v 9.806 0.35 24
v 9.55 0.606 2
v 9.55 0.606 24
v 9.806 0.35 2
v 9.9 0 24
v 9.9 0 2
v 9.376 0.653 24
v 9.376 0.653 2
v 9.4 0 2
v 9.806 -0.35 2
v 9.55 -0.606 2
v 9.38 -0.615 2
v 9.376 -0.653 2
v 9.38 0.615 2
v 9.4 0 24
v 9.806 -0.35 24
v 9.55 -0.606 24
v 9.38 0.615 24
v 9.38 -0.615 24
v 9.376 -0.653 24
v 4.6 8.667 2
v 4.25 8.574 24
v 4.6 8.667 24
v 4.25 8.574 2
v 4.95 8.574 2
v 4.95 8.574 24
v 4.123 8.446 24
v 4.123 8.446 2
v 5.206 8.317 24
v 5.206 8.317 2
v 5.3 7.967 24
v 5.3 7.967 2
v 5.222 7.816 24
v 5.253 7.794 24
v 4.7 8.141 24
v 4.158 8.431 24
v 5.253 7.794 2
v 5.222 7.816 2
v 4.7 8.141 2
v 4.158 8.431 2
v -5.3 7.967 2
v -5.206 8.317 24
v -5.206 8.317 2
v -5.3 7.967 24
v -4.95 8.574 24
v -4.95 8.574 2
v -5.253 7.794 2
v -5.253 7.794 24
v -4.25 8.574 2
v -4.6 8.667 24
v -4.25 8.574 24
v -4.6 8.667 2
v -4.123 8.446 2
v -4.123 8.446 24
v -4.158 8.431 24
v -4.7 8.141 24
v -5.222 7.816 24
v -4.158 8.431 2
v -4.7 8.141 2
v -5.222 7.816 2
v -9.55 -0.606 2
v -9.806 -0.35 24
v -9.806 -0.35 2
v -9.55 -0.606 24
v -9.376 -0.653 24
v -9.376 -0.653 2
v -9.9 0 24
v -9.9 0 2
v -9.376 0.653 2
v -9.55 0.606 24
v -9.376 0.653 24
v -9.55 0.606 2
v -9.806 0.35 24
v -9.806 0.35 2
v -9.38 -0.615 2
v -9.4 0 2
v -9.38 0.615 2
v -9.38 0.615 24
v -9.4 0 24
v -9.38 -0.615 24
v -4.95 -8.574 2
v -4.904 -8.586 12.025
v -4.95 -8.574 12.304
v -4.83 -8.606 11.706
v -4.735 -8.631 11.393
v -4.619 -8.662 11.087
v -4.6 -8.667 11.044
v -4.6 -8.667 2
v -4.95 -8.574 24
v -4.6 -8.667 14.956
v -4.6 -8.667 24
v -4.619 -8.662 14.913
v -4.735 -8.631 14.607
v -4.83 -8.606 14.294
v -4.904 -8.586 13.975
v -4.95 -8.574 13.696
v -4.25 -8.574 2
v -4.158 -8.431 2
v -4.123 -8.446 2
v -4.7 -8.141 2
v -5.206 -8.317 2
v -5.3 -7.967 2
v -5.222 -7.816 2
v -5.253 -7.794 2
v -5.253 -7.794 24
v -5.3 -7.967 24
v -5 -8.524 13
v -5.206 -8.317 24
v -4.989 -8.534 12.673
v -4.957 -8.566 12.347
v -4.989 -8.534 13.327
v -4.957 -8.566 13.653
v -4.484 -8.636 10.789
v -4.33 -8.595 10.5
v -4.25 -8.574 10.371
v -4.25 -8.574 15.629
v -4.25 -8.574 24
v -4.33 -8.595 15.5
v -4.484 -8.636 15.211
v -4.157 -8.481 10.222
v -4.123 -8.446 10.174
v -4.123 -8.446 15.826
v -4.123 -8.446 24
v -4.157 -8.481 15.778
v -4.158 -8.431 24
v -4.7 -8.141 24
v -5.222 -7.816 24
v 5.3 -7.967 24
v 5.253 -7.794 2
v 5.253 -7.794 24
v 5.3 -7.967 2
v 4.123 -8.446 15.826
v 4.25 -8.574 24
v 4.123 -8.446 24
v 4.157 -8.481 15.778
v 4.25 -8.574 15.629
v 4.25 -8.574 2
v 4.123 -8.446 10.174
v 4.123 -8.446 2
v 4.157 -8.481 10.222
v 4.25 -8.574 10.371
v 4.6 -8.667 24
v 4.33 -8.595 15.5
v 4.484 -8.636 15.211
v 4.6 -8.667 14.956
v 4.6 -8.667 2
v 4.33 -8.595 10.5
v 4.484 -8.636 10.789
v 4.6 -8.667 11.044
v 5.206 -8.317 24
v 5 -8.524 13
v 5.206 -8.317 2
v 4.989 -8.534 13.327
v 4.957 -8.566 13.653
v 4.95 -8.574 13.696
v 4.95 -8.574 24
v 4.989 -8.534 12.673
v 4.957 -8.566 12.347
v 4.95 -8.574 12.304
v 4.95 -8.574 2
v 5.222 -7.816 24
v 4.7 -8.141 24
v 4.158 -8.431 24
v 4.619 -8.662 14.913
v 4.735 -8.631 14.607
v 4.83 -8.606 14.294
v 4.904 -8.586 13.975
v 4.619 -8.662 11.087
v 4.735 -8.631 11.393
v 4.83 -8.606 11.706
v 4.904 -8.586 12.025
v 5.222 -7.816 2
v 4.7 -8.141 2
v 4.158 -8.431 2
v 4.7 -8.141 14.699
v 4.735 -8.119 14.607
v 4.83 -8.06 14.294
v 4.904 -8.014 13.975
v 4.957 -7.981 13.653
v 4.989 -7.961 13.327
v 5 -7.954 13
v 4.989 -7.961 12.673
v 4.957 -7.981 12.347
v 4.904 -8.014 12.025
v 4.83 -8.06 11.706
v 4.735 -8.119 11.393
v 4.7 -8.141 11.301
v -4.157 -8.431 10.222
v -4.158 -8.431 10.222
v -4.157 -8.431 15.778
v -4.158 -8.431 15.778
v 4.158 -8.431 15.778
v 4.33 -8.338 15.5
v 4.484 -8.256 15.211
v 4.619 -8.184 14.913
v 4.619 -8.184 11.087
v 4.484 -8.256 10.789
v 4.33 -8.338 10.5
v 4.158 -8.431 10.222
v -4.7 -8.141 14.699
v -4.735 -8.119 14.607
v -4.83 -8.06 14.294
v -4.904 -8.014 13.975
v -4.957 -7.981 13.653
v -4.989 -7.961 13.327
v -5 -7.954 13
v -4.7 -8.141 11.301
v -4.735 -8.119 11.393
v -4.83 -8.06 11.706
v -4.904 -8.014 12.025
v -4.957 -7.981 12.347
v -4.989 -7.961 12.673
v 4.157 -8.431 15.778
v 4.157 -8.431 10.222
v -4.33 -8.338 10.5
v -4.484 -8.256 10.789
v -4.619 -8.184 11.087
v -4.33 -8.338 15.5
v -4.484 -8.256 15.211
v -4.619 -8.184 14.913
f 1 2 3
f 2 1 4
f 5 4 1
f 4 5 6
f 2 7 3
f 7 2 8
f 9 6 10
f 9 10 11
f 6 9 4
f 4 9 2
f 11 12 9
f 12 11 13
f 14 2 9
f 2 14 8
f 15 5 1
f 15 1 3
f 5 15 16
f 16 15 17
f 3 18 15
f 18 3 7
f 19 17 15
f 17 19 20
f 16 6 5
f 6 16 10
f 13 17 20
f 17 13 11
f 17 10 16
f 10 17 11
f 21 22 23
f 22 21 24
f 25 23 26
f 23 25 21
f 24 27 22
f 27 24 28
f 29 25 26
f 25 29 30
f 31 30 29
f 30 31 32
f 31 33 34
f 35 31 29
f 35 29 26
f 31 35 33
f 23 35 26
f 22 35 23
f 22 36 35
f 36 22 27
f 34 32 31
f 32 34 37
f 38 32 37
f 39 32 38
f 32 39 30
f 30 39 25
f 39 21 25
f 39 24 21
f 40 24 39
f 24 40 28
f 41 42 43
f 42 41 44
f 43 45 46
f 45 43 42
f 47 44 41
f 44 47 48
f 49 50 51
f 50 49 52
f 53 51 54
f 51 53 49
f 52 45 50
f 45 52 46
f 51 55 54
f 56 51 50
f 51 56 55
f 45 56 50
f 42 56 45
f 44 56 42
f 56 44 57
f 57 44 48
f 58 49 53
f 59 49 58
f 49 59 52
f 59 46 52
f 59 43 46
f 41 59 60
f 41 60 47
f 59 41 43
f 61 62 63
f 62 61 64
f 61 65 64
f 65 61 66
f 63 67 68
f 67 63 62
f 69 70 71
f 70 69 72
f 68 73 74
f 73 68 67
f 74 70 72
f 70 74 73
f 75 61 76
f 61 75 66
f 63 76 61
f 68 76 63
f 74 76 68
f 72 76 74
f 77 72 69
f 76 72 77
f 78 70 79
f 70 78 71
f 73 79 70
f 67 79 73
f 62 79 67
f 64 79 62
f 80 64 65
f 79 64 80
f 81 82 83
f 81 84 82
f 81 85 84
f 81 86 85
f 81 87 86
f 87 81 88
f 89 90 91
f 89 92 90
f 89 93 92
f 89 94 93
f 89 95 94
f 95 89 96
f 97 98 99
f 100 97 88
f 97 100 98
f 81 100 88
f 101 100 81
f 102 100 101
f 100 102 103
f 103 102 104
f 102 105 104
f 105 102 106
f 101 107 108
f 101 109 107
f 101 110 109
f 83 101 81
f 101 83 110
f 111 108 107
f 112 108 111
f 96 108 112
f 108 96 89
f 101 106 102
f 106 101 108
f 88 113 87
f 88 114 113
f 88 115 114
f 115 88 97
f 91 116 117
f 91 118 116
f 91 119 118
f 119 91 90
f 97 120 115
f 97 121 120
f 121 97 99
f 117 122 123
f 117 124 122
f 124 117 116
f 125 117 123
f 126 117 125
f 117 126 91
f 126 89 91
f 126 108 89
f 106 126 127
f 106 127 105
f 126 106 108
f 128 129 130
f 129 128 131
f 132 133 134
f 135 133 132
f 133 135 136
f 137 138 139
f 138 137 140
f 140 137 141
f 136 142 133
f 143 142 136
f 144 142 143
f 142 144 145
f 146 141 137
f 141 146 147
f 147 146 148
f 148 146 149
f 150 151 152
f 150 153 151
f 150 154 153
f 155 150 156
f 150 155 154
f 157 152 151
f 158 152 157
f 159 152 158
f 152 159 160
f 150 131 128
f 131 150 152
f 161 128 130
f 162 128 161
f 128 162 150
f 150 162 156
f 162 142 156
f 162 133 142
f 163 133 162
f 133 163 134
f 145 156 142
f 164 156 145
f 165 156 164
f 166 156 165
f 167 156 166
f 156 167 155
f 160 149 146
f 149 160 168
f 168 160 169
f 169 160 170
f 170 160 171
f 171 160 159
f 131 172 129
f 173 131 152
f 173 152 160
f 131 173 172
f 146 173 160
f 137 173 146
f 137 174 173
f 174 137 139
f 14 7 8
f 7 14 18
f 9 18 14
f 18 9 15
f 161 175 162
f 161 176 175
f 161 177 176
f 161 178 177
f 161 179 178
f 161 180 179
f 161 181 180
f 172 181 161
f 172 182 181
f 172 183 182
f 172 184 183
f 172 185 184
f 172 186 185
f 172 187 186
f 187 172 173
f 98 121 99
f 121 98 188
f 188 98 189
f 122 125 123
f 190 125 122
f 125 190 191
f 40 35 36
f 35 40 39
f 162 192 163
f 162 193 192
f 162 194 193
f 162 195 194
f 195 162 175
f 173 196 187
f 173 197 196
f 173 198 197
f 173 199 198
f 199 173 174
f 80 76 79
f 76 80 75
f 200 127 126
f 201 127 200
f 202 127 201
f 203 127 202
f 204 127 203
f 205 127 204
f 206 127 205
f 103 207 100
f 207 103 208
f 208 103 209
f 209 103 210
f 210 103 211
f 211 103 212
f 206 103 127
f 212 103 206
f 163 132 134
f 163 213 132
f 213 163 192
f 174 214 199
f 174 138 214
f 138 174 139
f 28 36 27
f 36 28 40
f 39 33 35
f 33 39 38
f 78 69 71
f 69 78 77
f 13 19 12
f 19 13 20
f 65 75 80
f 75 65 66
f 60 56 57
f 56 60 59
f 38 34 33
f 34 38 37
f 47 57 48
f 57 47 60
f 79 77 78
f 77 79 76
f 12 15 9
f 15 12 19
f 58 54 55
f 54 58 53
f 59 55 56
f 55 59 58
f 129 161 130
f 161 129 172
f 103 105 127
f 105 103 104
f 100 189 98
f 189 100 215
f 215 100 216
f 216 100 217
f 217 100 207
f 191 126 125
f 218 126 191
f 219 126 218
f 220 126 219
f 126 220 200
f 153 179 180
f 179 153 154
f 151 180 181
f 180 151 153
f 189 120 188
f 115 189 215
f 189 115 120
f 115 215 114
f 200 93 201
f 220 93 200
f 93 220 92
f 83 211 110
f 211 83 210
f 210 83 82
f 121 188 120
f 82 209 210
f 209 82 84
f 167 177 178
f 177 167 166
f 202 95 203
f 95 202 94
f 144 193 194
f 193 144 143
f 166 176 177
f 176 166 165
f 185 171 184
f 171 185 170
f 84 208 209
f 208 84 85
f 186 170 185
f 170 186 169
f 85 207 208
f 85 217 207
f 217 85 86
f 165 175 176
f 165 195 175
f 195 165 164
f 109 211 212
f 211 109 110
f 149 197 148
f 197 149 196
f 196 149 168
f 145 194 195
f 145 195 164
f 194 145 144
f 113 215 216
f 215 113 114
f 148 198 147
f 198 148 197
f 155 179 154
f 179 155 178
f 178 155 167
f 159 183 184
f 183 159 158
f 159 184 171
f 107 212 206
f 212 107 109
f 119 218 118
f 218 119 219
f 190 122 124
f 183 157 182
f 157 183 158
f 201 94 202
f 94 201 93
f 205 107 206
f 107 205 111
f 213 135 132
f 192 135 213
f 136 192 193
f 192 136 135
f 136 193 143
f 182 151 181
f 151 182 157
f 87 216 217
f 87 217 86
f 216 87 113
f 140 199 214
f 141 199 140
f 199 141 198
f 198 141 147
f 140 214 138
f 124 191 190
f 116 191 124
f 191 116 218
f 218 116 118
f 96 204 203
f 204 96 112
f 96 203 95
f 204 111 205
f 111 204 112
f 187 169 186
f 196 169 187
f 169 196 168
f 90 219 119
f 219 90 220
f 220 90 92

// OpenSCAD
// file: params.scad
// ===========================================================================
// CueCam - shared parameters
// Every printed part in this folder is driven from here. Change a number,
// re-export, reprint. Units: mm.
// ===========================================================================

/* [Cue geometry] */
CUE_LEN        = 1473.2;   // 58 in
JOINT1_X       = 482.6;    // 19 in - the "one third from the tip" station
SHAFT_DIA_AT_J1= 14.2;     // cue diameter where the collar starts

/* [Camera collar] -------------------------------------------------------- */
// POD_OD is THE parameter. 24 suits a 16 mm-wide custom PCB; use 29 for a
// de-cased RunCam Thumb Pro. Anything over 30 is unplayable - see docs.
POD_OD         = 24.0;
COLLAR_LEN     = 117.4;
COLLAR_WALL    = 2.0;
BAY_LEN        = 70.0;     // cartridge bay
BAY_DIA        = 19.2;     // bay bore
LEAD_IN        = 29.4;     // front blend length
LEAD_OUT       = 38.0;     // rear blend length

/* [Bayonet] -------------------------------------------------------------- */
BAY_LUGS       = 2;        // lugs, equally spaced
LUG_W          = 4.0;      // circumferential width
LUG_H          = 1.8;      // radial height
LUG_T          = 3.0;      // axial thickness
BAYONET_ANGLE  = 28;       // degrees of twist to lock
DETENT_R       = 0.55;     // detent bump radius
EJECT_TRAVEL   = 9.0;      // how far the spring pushes the cartridge out

/* [Cartridge] ------------------------------------------------------------ */
CART_OD        = 18.6;     // slides in BAY_DIA with the boot around it
CART_WALL      = 1.2;
PCB_W          = 16.0;
PCB_T          = 1.6;
PCB_L          = 58.0;
CELL_W         = 20.0;     // LiPo 402040
CELL_T         = 4.0;
CELL_L         = 40.0;
SD_W           = 11.0;
SD_T           = 1.0;

/* [Optics] --------------------------------------------------------------- */
LENS_R         = 11.0;     // lens height above the cue axis
LENS_BORE      = 8.0;      // M12 lens barrel clearance
WINDOW_W       = 6.0;
WINDOW_H       = 4.0;
WINDOW_T       = 0.8;
// Max nose-down tilt before the cue's own shaft blocks the axis is 0.67 deg
// (tools/optics.py). So: zero. The lens looks straight down the cue.
LENS_TILT      = 0.0;

/* [Butt] ----------------------------------------------------------------- */
BUTT_OD        = 29.5;
BUTT_WALL      = 1.4;
BOLT_BORE_DIA  = 8.0;      // 5/16-14 clearance
BOLT_BORE_LEN  = 190.0;    // long on purpose: halves the balance swing
CAP_LEN        = 26.0;
BUMPER_THREAD  = 12.0;     // M12x1, LEFT hand

/* [Grip] ----------------------------------------------------------------- */
GRIP_LEN       = 260.0;
GRIP_WALL      = 2.6;
GRIP_SPLIT     = 1.2;      // split width so it springs over the butt
INDEX_RIB_W    = 2.0;      // tells your hand where the lens is

/* [Tip] ------------------------------------------------------------------ */
TIP_DIA        = 9.5;
FERRULE_LEN    = 13.0;
FERRULE_BORE   = 6.3;
STUD           = "4-40";   // #4-40 UNC, 2.845 mm major

/* [Print] ---------------------------------------------------------------- */
FIT            = 0.20;     // clearance on sliding fits, PA6-CF on a P1S
PRESS          = 0.05;     // interference on bonded fits
$fn            = 96;
// file: lib.scad
// Small helpers shared by the CueCam parts.
include <params.scad>;

// A solid of revolution from a list of [x, radius] points.
module revolve(profile, fn = $fn) {
    rotate_extrude($fn = fn)
        polygon(concat([[0, profile[0][0]]],
                       [for (p = profile) [p[1], p[0]]],
                       [[0, profile[len(profile) - 1][0]]]));
}

// Smootherstep, the same blend the drawings use, so printed parts and
// drawings agree on the collar silhouette.
function blend(t) = let (u = max(0, min(1, t))) u*u*u*(u*(u*6 - 15) + 10);

function collar_r(x) =
      x <= LEAD_IN
    ? (SHAFT_DIA_AT_J1 + (POD_OD - SHAFT_DIA_AT_J1) * blend(x / LEAD_IN)) / 2
    : x <= COLLAR_LEN - LEAD_OUT
    ? POD_OD / 2
    : (POD_OD + (15.9 - POD_OD)
        * blend((x - (COLLAR_LEN - LEAD_OUT)) / LEAD_OUT)) / 2;

function collar_profile(n = 80) =
    [for (i = [0 : n]) let (x = COLLAR_LEN * i / n) [x, collar_r(x)]];

// A bayonet track cut: axial entry, then a circumferential run to a detent.
module bayonet_track(r, angle = BAYONET_ANGLE, w = LUG_W + 2*FIT,
                     t = LUG_T + 2*FIT, depth = LUG_H + FIT) {
    // axial entry slot
    translate([0, 0, -0.1]) rotate([0, 0, -w/2 / (PI*r) * 180])
        rotate_extrude(angle = w / (PI * r) * 180, $fn = 128)
            translate([r - depth, 0]) square([depth + 1, t + 2]);
    // circumferential run
    translate([0, 0, t - 0.1])
        rotate_extrude(angle = angle, $fn = 128)
            translate([r - depth, 0]) square([depth + 1, w]);
}

module knurl(r, h, n = 36, d = 0.6) {
    for (i = [0 : n - 1]) rotate([0, 0, i * 360 / n])
        translate([r, 0, 0]) cylinder(h = h, d = d, $fn = 8);
}
// main file
// ===========================================================================
// TPU 95A shock boot - the only thing between a 500 g axial spike and the
// camera. Print two (front and rear) from an external spool, not the AMS.
// ===========================================================================
include <lib.scad>;

BOOT_LEN = 26;
RIB_N    = 6;

difference() {
    union() {
        cylinder(h = BOOT_LEN, d = BAY_DIA - 2*FIT);
        // crush ribs: they, not the wall, set the preload
        for (i = [0 : RIB_N - 1]) rotate([0, 0, i * 360 / RIB_N])
            translate([BAY_DIA/2 - FIT - 0.2, 0, 2])
                cylinder(h = BOOT_LEN - 4, d = 1.4, $fn = 12);
    }
    translate([0, 0, -1]) cylinder(h = BOOT_LEN + 2, d = CART_OD + FIT);
    // lens window must not be covered
    translate([0, 0, 13]) rotate([90, 0, 0]) cylinder(h = BAY_DIA, d = LENS_BORE + 2);
}
